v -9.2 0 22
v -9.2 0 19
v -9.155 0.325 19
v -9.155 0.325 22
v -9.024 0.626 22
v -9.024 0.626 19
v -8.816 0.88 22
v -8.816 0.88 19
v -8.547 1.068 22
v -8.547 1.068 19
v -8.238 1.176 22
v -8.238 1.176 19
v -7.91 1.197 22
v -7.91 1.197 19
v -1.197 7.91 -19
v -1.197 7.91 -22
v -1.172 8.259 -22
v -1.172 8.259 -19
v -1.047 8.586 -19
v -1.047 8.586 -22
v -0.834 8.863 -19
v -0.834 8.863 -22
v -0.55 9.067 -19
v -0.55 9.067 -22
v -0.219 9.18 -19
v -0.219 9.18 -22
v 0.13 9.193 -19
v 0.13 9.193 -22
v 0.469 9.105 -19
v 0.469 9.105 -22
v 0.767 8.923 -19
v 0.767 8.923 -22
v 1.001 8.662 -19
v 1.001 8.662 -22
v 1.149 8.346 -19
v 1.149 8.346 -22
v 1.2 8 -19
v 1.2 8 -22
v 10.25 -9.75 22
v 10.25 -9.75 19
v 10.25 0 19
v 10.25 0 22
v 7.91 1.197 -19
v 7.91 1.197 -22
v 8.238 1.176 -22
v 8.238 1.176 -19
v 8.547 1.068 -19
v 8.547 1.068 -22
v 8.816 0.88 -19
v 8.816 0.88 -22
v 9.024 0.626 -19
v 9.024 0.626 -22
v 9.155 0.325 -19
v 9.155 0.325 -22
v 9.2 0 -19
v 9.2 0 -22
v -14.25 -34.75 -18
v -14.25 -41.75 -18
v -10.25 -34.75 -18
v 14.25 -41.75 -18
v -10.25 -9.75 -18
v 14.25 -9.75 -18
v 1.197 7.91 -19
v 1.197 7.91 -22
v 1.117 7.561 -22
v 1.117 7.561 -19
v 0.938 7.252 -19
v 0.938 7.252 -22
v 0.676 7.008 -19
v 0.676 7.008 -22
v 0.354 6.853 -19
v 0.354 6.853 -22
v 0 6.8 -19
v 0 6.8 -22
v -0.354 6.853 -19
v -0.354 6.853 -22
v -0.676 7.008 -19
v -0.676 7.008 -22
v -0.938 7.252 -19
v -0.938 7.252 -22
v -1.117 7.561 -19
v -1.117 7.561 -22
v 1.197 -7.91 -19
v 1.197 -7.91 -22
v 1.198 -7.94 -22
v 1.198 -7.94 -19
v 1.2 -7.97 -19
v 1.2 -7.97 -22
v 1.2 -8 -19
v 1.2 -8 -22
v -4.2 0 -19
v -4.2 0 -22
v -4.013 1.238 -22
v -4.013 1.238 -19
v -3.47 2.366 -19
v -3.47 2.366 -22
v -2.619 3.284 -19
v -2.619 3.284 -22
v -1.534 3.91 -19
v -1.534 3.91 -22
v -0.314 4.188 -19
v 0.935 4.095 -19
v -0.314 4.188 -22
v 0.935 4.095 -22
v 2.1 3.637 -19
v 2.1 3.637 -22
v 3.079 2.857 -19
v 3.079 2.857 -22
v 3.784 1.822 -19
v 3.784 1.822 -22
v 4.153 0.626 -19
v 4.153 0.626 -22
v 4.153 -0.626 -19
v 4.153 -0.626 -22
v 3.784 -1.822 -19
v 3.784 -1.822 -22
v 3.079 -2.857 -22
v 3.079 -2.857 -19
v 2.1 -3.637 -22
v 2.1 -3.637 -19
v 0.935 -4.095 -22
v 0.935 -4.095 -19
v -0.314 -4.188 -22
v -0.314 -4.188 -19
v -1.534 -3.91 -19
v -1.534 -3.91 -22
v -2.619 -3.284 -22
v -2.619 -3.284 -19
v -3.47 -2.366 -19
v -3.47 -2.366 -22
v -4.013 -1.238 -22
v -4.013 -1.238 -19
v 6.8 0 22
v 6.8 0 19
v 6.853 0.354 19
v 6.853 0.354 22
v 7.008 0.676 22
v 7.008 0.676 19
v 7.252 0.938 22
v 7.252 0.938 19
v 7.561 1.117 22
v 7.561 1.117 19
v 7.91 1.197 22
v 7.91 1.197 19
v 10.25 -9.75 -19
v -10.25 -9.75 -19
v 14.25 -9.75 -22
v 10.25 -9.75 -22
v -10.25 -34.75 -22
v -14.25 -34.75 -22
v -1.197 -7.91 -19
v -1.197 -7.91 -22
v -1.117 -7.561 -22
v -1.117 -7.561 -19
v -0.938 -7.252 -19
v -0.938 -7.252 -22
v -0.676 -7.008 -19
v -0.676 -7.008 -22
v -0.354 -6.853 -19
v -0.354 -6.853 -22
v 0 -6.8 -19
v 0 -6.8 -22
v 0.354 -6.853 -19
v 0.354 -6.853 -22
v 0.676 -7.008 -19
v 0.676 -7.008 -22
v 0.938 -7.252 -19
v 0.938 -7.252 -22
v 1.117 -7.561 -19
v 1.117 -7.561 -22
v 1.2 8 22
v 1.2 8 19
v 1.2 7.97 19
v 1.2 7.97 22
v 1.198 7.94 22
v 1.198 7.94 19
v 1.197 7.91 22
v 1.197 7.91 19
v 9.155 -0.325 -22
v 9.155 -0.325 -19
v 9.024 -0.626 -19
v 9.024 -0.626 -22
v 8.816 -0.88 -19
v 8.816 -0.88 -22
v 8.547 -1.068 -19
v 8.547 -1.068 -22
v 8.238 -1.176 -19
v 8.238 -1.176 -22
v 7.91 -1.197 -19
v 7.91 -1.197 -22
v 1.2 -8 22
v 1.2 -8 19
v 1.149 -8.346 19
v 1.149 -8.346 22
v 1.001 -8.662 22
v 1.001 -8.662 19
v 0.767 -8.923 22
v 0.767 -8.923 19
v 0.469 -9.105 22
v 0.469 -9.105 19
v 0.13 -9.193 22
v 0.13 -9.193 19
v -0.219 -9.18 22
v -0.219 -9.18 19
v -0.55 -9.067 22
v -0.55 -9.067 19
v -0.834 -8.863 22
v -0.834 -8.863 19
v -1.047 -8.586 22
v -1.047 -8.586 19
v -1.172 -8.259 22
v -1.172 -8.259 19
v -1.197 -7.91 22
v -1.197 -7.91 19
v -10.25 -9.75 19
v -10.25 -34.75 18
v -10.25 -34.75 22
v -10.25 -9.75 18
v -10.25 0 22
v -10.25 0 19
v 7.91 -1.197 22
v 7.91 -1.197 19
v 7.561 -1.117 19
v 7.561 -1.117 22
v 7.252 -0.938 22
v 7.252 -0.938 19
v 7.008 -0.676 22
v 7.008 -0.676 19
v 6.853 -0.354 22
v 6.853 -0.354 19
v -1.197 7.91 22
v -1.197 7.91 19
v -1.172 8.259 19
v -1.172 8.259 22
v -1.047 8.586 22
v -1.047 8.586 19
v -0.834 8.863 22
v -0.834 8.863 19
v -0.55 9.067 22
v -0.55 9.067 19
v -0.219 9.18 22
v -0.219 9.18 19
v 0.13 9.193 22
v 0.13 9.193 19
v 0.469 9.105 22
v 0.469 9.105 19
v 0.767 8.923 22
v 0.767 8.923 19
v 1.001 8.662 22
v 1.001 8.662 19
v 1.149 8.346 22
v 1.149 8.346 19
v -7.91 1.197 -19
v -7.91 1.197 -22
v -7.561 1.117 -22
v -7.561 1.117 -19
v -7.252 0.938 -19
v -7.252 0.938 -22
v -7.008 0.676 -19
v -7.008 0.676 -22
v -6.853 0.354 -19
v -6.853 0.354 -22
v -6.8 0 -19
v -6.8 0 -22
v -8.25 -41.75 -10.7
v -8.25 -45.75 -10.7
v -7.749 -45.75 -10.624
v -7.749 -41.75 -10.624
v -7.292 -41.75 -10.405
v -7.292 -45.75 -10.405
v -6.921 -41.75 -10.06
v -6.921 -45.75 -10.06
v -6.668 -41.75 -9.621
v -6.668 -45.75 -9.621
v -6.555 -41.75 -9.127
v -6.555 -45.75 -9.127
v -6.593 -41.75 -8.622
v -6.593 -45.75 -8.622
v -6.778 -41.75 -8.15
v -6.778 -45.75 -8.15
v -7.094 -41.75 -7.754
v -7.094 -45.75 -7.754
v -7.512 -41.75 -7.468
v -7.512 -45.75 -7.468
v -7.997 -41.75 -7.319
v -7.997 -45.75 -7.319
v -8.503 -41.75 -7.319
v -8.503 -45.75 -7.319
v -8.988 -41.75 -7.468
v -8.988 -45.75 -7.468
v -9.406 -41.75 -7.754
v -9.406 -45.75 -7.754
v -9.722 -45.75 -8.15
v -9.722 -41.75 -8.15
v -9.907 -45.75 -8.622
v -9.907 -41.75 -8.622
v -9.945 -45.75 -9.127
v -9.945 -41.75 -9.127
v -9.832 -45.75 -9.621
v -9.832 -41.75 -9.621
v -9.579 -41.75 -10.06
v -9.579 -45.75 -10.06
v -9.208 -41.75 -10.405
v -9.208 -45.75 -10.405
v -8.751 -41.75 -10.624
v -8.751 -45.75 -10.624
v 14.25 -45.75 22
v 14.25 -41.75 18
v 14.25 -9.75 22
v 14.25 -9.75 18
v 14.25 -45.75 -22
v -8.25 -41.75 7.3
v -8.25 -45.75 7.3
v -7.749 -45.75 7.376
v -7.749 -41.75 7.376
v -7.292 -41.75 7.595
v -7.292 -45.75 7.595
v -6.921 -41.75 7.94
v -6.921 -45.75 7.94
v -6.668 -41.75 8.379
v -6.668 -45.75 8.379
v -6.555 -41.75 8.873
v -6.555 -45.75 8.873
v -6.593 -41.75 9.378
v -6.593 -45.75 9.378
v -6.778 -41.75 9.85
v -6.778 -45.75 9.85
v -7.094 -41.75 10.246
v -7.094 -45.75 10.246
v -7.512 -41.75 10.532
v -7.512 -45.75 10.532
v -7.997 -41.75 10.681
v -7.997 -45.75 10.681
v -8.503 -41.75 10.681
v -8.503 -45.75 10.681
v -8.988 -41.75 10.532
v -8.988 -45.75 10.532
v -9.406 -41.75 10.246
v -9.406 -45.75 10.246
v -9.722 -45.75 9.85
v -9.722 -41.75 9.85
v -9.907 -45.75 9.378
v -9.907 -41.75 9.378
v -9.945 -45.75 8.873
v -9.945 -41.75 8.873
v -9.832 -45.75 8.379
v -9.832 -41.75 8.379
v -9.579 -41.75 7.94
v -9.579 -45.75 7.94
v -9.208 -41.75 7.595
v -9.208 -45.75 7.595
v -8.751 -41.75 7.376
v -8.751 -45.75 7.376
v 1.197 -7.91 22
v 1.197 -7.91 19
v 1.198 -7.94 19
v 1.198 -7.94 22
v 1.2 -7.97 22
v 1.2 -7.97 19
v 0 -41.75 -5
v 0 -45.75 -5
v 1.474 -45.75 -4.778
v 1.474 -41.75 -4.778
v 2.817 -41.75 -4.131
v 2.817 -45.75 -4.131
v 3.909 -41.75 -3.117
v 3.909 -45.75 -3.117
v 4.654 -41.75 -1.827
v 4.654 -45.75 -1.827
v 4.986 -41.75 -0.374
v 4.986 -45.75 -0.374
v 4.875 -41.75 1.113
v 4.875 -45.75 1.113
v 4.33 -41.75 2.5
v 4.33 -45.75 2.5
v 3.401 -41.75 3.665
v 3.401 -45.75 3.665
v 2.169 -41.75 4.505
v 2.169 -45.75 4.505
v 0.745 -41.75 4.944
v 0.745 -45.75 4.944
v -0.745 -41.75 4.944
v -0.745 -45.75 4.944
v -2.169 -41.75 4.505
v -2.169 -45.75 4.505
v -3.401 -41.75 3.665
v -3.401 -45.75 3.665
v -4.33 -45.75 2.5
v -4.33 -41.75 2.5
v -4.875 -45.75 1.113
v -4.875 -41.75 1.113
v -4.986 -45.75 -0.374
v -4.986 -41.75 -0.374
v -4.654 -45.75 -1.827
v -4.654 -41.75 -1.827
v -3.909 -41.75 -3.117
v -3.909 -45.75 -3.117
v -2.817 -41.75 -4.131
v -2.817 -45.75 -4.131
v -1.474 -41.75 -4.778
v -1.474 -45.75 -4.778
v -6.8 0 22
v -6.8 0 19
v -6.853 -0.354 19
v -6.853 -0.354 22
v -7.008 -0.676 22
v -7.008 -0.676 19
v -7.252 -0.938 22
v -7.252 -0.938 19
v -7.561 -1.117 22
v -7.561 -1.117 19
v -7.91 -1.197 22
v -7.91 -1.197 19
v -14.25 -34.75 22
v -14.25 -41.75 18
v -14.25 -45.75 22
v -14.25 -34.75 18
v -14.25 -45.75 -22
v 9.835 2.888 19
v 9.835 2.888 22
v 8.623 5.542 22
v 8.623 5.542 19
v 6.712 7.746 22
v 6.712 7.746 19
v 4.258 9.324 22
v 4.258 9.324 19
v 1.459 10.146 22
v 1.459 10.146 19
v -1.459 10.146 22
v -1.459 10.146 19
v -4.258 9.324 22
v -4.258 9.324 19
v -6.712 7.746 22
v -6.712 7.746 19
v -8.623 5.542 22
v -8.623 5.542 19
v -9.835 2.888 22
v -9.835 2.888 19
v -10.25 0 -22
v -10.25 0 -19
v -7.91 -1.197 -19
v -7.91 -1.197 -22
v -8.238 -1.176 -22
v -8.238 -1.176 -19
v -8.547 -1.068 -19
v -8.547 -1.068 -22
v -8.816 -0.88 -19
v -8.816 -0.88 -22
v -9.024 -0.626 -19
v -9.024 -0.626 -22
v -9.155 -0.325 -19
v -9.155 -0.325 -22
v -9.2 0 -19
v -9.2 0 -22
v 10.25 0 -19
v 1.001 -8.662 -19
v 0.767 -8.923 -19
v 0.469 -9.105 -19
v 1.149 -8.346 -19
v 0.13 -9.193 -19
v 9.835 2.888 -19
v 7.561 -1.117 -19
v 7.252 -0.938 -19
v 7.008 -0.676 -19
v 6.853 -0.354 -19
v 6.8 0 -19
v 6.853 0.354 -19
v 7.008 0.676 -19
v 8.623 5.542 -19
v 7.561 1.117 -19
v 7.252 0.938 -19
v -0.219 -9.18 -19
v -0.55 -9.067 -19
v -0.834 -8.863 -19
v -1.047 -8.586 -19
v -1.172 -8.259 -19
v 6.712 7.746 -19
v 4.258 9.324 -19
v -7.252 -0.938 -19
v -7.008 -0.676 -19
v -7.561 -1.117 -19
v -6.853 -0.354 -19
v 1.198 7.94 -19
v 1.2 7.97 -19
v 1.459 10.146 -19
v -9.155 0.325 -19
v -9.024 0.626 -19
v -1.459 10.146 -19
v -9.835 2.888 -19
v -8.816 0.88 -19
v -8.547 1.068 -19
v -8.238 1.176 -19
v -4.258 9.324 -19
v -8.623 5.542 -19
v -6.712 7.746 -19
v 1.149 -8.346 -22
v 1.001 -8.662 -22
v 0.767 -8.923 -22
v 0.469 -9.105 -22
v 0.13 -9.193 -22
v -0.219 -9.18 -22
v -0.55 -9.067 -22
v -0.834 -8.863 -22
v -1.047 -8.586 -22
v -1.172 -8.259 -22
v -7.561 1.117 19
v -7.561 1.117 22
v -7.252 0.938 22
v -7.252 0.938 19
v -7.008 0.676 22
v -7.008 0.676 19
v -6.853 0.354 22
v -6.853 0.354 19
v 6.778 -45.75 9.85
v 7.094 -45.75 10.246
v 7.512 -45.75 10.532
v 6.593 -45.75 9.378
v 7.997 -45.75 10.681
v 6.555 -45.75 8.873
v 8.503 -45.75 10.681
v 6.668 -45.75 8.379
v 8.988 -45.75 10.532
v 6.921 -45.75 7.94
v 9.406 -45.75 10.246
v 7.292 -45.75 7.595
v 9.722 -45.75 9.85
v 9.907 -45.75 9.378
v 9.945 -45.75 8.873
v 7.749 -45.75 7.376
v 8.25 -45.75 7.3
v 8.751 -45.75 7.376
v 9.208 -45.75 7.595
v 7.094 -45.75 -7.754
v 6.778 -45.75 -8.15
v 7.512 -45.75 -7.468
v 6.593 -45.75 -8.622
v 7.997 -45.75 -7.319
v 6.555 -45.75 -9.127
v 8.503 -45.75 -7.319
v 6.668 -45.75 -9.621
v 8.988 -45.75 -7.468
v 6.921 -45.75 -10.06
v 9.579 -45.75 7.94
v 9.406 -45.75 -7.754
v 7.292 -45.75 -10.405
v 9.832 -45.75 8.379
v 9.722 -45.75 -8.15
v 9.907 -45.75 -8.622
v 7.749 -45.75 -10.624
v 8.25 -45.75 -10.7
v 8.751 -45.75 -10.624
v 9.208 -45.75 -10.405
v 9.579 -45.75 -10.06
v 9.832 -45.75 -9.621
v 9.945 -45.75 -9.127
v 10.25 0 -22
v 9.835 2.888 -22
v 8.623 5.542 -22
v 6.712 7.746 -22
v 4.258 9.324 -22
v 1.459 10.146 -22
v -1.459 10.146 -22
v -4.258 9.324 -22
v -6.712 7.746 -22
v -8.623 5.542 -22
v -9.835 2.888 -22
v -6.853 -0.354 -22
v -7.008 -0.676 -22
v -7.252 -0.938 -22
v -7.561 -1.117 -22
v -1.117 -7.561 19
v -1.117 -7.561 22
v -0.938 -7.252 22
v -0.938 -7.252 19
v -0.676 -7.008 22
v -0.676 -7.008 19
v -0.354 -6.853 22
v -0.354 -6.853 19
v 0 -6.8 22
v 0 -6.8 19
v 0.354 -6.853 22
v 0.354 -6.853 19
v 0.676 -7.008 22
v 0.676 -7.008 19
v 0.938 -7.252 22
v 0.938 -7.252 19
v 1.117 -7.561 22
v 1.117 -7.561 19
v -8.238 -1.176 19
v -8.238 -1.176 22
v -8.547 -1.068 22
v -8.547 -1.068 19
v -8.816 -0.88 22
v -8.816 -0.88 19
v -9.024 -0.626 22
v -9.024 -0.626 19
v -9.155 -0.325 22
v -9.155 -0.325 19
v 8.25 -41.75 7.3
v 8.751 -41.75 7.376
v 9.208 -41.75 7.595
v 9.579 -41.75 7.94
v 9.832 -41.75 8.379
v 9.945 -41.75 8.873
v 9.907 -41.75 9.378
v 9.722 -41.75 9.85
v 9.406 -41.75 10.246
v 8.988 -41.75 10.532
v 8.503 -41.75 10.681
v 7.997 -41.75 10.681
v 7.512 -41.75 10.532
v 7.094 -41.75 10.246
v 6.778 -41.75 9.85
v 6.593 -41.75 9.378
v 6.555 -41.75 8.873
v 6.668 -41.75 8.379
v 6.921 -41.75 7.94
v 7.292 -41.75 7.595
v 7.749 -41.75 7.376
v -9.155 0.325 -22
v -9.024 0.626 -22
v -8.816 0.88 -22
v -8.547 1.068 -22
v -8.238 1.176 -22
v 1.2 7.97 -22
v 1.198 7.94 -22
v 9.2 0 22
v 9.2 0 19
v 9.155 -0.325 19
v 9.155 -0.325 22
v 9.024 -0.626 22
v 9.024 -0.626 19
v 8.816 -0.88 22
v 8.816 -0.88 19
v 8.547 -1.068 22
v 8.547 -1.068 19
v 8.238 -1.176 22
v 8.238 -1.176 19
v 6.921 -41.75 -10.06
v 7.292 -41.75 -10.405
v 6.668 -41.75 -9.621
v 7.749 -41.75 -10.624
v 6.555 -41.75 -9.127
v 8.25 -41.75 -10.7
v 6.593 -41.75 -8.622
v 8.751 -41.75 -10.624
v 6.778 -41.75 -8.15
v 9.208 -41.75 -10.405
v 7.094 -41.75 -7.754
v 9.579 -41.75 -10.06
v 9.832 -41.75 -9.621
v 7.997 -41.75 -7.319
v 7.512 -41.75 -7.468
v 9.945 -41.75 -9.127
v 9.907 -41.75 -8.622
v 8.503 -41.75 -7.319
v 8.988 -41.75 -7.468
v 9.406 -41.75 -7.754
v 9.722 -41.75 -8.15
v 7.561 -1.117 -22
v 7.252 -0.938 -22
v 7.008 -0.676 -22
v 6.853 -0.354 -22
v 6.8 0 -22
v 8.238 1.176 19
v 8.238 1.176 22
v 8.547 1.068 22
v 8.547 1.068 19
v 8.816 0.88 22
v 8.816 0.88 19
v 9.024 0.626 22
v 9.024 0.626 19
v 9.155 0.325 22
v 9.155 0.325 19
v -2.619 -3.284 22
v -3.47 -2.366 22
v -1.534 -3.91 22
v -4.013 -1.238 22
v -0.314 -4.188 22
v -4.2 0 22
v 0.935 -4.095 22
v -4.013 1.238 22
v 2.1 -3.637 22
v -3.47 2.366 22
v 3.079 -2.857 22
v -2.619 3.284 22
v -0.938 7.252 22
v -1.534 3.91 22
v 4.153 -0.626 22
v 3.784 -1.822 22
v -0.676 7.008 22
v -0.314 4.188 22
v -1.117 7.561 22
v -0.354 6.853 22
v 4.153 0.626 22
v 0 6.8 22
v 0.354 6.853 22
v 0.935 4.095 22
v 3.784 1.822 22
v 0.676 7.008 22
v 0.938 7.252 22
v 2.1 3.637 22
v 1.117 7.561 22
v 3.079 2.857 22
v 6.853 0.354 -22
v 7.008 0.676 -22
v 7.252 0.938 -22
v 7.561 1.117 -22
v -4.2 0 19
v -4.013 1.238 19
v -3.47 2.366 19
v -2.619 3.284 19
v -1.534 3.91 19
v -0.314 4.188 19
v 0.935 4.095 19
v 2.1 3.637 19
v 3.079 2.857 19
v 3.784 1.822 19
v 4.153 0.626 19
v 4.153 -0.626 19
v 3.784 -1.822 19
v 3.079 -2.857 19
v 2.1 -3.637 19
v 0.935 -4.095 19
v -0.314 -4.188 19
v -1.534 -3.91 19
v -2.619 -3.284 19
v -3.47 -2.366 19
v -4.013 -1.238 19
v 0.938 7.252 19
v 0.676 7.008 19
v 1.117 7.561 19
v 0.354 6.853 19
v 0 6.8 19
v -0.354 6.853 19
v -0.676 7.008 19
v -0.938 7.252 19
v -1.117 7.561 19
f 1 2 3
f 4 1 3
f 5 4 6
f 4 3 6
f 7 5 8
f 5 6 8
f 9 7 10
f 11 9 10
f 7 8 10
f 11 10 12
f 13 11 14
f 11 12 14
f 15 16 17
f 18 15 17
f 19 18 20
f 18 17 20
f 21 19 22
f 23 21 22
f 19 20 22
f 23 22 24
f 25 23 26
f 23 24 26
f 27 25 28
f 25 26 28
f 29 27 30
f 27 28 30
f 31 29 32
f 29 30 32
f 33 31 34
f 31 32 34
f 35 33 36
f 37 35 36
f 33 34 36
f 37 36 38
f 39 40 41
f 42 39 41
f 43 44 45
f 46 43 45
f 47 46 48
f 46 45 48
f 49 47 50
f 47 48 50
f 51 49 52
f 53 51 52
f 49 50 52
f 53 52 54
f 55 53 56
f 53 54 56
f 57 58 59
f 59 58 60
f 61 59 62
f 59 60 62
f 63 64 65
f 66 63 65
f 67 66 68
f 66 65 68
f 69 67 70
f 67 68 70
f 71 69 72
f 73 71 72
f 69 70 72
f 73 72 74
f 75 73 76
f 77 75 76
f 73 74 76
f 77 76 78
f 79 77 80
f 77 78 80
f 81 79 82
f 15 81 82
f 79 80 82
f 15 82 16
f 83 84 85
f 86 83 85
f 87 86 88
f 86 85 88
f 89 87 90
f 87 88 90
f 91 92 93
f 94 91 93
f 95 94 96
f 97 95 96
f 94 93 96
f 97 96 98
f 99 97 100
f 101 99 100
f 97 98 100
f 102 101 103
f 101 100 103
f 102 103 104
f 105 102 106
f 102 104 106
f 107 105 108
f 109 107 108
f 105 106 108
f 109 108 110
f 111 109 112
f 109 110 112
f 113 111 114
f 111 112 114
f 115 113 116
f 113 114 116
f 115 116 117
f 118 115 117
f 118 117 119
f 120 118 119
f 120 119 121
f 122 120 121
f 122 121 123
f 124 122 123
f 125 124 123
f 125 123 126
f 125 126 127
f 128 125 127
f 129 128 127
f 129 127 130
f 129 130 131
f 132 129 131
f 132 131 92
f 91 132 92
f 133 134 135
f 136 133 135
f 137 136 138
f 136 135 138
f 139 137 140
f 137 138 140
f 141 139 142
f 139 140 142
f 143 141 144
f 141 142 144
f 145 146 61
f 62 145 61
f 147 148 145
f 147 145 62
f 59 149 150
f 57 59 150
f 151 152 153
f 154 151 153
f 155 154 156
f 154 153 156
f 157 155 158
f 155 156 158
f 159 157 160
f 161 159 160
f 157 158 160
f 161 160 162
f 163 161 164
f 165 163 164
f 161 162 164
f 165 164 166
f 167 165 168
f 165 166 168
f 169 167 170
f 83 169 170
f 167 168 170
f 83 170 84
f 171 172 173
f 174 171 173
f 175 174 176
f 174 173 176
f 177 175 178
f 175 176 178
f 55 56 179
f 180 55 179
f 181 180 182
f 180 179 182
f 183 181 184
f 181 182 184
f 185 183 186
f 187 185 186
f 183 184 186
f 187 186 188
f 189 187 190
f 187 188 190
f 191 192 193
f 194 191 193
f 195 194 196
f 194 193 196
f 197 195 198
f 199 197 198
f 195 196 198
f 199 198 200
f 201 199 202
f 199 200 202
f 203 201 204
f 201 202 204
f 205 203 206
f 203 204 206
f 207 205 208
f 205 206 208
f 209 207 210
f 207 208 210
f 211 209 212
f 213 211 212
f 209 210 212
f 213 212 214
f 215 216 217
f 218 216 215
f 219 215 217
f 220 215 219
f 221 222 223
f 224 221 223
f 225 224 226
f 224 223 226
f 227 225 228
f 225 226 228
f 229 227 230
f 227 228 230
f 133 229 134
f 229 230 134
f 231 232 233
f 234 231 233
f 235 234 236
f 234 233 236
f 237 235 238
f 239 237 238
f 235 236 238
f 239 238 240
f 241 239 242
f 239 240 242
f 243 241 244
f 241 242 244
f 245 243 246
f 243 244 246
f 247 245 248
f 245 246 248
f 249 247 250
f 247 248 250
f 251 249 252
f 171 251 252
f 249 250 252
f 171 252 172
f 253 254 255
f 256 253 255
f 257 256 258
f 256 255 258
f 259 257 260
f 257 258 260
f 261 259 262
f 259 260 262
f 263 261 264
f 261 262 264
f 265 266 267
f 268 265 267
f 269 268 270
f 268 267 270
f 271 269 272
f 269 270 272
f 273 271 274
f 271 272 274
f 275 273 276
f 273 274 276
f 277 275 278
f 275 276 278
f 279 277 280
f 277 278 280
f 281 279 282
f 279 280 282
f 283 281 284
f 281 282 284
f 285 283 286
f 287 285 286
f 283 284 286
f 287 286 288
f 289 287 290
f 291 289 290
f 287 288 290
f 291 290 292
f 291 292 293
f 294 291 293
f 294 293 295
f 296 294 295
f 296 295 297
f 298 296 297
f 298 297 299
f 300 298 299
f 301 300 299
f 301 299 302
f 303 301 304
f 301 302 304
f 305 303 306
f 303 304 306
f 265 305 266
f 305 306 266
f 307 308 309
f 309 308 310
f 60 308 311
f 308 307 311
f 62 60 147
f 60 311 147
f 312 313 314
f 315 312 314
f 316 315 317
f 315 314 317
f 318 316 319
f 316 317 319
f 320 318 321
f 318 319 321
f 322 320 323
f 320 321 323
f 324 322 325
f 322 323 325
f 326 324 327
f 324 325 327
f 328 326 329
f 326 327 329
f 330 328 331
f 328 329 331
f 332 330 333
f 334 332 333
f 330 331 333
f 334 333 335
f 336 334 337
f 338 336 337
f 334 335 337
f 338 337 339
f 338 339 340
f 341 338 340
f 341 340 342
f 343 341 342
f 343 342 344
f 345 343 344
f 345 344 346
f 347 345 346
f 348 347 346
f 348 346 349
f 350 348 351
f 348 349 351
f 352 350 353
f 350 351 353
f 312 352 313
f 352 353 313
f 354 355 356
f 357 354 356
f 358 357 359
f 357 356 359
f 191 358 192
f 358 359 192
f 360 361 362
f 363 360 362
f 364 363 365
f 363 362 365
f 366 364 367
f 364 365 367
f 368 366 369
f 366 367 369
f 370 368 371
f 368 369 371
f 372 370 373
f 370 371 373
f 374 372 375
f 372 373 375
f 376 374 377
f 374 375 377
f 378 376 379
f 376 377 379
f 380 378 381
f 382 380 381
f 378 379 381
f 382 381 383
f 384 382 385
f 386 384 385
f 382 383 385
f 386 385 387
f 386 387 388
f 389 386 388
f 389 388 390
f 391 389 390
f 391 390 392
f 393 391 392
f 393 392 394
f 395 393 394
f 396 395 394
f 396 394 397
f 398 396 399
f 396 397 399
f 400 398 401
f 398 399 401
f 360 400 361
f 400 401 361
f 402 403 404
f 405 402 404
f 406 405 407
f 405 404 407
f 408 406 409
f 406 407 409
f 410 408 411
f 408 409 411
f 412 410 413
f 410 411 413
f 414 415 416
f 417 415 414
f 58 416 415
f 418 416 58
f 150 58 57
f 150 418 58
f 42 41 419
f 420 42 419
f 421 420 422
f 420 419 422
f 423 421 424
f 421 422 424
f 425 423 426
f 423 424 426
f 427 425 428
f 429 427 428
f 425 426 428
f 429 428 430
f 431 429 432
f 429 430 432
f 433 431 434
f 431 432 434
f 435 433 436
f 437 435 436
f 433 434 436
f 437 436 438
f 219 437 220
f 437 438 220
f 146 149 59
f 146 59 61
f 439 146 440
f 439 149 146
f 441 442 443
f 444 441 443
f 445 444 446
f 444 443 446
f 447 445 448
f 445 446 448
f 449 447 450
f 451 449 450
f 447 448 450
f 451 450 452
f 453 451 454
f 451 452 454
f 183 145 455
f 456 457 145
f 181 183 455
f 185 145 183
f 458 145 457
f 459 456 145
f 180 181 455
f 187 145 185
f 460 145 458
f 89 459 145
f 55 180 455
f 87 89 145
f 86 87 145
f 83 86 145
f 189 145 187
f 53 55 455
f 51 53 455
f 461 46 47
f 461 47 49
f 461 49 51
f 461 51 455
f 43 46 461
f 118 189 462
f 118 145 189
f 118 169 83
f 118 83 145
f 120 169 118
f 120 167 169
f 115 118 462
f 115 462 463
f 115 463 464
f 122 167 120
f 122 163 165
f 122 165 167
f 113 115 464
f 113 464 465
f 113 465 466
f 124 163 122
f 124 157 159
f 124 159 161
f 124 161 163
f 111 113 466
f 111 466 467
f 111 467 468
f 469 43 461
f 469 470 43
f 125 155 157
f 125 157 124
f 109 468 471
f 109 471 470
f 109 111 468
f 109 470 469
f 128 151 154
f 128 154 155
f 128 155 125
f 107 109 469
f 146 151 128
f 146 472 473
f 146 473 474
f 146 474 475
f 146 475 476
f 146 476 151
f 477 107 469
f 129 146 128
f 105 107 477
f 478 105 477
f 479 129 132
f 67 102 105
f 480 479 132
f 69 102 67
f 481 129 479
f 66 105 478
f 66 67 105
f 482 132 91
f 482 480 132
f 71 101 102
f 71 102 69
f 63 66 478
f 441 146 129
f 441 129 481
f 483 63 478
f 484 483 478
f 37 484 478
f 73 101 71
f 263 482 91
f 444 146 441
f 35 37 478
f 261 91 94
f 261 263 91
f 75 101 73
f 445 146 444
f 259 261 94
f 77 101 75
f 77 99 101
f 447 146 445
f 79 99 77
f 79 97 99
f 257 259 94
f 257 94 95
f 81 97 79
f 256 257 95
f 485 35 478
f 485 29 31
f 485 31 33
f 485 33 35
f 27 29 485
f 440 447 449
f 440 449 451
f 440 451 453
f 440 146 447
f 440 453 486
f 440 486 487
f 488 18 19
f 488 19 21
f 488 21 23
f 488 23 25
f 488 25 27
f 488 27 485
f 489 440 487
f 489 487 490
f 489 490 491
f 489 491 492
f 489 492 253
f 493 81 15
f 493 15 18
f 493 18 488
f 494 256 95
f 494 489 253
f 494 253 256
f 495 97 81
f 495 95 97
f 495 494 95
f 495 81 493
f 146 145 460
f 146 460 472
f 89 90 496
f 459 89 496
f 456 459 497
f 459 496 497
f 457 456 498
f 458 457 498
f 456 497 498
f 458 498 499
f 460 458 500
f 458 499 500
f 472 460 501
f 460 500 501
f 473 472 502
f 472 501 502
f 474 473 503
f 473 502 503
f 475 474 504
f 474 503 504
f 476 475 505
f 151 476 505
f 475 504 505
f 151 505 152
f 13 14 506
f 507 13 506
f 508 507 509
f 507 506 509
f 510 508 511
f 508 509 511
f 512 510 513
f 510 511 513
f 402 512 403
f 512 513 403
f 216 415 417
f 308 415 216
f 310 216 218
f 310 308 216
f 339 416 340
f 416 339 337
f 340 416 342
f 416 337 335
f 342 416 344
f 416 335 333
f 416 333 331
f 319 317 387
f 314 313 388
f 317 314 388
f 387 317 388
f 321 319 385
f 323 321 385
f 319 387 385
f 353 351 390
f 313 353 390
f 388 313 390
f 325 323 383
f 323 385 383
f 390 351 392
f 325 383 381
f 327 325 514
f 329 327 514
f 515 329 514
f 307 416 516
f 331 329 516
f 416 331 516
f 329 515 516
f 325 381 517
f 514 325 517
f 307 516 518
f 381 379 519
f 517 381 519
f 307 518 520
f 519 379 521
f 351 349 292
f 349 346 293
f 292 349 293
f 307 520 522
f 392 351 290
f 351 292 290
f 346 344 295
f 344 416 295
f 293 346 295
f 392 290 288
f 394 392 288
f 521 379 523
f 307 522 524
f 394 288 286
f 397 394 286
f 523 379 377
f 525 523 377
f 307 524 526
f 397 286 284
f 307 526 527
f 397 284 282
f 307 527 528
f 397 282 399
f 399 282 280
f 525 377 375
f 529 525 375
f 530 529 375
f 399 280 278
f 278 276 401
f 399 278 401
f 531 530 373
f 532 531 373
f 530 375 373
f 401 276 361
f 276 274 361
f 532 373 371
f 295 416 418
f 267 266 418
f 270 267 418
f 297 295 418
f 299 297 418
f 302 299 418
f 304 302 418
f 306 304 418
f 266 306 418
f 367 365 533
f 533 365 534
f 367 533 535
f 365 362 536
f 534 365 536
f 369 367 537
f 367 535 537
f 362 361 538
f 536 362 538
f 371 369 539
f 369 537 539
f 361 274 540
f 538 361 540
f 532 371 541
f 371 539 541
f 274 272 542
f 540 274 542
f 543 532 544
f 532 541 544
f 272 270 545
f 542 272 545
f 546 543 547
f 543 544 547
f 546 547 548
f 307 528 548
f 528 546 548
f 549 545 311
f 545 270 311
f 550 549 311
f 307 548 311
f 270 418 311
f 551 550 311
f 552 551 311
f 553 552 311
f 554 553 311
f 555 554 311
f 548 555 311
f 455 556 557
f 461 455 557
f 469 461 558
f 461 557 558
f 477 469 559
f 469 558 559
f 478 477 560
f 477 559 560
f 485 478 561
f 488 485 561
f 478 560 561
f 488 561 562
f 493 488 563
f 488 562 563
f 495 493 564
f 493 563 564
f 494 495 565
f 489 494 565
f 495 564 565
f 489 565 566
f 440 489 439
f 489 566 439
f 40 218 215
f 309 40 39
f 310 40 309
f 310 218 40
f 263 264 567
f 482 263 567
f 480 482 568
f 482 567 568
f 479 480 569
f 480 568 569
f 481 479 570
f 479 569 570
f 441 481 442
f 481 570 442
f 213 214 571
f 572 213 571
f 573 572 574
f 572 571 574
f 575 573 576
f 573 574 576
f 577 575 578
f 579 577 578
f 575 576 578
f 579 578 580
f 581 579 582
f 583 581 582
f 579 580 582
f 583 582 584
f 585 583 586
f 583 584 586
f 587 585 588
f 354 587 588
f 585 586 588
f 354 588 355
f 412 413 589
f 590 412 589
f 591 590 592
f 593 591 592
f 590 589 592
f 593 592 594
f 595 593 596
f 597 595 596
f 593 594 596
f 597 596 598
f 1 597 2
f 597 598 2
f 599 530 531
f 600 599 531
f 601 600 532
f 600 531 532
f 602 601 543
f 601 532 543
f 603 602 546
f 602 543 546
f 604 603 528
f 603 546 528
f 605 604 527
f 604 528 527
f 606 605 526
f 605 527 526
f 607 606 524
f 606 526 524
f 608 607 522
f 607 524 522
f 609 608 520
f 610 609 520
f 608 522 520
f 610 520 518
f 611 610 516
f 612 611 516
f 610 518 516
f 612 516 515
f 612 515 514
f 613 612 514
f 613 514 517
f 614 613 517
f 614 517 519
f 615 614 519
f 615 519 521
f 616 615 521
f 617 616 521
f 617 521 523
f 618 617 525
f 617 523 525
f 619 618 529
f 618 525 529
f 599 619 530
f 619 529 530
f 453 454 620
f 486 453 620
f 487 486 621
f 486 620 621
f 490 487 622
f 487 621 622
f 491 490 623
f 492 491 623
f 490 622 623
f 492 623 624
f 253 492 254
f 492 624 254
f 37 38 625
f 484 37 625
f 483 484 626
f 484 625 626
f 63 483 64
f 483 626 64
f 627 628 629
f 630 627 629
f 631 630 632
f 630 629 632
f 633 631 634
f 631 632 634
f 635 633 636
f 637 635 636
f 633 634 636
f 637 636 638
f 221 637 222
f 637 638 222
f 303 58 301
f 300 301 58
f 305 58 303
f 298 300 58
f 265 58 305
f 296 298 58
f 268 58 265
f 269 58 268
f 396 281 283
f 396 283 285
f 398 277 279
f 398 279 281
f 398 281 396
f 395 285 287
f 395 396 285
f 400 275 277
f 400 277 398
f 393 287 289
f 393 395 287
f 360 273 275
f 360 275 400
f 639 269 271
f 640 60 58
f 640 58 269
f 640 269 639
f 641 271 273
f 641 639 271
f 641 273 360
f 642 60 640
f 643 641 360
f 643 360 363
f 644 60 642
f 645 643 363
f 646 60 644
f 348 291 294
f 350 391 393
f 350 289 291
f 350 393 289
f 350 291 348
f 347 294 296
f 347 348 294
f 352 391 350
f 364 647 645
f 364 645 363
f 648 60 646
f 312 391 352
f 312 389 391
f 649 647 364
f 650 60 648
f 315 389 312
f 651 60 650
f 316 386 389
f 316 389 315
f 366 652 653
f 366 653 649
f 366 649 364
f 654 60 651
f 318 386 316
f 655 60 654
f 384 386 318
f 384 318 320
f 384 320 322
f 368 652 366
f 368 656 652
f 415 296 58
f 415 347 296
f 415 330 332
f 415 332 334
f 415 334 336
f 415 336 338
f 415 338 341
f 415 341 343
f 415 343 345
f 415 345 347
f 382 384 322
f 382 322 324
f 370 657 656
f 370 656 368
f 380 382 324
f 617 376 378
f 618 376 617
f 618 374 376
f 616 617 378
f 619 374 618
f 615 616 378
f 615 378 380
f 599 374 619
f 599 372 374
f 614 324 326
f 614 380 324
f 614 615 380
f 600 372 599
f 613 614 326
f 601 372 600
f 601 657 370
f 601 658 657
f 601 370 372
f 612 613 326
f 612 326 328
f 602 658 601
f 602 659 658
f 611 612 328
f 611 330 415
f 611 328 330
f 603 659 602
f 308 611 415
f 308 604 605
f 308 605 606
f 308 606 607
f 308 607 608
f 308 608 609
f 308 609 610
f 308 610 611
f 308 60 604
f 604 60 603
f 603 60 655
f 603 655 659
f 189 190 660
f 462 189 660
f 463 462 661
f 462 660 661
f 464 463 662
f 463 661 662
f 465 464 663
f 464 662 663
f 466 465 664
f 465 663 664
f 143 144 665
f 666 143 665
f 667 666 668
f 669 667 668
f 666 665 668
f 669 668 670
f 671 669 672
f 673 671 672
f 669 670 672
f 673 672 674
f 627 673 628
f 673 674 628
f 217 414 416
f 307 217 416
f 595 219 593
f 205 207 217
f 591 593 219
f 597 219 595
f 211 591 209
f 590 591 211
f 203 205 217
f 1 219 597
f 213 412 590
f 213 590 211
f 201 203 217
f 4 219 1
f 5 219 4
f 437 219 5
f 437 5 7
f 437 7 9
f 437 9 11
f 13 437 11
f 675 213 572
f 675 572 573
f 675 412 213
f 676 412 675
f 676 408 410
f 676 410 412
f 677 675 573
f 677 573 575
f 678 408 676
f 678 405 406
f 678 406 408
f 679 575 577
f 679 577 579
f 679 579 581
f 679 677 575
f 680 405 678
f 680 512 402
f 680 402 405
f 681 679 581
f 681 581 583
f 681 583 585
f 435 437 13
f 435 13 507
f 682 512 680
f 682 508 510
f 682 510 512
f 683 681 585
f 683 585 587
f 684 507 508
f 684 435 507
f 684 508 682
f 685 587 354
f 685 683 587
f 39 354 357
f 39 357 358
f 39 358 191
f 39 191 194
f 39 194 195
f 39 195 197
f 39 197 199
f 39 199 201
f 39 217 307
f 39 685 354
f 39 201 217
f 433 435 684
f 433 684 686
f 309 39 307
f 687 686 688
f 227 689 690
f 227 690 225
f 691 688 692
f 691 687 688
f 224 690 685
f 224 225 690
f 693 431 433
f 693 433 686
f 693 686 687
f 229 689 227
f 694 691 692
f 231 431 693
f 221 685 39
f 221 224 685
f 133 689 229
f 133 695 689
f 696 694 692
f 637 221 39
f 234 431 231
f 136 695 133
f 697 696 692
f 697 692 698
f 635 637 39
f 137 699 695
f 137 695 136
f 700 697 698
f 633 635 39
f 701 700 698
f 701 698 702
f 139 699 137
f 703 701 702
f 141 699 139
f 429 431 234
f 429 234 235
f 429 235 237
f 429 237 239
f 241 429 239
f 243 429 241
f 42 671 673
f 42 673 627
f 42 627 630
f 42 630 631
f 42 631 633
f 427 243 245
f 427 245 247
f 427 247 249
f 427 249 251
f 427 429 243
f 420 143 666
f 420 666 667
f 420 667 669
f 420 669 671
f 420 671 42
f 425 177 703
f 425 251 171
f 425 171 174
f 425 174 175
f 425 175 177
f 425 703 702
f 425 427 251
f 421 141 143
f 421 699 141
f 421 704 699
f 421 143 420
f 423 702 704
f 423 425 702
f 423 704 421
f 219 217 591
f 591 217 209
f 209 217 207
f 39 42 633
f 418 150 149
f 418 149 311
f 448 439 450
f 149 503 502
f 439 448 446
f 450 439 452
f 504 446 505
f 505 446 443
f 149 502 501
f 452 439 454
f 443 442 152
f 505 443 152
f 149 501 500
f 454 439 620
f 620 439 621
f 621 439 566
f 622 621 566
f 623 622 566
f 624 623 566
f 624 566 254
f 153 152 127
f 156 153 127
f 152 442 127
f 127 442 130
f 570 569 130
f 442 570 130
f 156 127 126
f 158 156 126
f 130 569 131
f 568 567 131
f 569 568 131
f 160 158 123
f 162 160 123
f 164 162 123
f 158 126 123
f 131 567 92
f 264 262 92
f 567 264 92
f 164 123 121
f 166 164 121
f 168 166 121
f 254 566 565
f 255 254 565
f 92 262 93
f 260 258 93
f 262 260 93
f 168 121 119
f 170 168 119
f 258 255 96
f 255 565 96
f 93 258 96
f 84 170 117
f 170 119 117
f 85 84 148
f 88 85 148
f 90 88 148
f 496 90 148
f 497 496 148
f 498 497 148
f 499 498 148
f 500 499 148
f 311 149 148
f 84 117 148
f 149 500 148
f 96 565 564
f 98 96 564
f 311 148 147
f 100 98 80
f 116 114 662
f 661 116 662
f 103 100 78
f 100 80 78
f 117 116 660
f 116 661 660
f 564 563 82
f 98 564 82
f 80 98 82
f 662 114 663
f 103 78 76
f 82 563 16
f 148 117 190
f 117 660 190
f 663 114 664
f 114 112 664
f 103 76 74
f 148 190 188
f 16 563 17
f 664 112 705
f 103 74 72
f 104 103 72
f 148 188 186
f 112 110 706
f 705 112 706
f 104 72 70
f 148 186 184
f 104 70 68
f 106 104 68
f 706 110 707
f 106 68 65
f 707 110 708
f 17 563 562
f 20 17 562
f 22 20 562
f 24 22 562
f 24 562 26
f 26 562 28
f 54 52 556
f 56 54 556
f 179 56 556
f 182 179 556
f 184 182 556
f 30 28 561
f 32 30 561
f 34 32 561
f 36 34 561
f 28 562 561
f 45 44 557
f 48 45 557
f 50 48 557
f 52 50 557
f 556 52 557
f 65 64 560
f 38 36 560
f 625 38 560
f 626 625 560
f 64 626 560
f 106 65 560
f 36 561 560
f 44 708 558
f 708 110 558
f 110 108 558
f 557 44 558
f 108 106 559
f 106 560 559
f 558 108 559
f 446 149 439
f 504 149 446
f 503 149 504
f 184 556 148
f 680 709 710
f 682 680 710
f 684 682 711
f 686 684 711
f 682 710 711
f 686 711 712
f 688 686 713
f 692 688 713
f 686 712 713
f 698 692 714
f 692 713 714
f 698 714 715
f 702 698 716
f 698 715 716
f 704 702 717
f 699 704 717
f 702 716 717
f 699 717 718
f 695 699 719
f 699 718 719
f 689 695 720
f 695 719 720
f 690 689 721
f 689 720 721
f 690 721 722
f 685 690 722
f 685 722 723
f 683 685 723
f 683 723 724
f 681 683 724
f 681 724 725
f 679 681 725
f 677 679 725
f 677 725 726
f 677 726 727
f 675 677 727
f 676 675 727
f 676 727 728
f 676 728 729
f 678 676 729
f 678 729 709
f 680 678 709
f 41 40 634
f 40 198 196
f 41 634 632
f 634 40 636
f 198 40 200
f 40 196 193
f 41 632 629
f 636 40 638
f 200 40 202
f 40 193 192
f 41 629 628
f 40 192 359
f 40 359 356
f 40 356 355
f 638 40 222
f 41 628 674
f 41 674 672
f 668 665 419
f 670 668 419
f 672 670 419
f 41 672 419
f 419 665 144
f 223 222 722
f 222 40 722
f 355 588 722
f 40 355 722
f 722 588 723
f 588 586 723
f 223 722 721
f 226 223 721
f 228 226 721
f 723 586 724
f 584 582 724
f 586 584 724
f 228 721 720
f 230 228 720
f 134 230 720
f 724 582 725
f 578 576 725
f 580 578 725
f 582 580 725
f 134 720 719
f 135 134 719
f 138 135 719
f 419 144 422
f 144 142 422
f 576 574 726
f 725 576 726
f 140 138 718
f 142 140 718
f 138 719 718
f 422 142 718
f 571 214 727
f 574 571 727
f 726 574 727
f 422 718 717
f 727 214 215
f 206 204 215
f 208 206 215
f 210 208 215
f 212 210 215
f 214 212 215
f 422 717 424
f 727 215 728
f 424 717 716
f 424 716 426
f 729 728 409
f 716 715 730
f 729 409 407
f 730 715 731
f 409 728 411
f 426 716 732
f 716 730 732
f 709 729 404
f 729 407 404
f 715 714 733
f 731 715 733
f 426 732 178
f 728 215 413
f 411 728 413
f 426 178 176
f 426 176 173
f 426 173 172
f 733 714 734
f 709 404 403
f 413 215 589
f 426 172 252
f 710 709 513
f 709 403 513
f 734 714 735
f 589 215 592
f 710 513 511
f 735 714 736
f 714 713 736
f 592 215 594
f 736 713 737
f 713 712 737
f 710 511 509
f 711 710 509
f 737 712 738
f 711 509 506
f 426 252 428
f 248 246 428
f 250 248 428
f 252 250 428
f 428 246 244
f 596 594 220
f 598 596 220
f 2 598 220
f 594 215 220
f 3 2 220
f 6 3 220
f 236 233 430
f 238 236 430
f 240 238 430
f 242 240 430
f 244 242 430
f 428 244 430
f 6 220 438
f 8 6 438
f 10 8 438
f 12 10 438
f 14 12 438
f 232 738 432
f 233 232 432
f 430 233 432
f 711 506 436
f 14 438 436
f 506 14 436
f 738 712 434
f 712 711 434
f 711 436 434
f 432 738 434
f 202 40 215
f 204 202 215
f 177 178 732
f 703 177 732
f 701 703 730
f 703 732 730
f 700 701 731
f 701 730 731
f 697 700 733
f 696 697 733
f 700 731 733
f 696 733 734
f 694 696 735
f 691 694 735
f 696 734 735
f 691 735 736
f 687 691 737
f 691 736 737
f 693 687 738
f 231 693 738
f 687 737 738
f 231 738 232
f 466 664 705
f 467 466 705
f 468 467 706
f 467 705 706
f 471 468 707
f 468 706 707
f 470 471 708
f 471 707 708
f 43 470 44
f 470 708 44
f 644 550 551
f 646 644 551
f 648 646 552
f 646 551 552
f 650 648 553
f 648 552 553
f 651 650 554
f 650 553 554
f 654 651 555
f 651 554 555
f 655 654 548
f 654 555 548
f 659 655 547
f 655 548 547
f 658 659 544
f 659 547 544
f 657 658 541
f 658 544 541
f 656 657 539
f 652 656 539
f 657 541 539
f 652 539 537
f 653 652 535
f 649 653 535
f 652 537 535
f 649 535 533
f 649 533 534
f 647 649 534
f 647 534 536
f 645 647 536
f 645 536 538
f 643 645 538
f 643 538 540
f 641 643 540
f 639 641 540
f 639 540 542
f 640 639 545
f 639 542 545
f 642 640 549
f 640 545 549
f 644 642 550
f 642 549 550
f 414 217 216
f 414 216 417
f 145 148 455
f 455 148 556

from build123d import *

# Parameters (mm, degrees)
BOSS_EXTRUDE1_DEPTH      = 22
BOSS_EXTRUDE1_DEPTH_BACK = 22
SKETCH1_R                = 1.2
SKETCH1_R_2              = 4.2
SKETCH2_W                = 38
SKETCH2_H                = 20
CUT_EXTRUDE1_DEPTH       = 105.423416914
SKETCH3_W                = 7
SKETCH3_H                = 44
BOSS_EXTRUDE2_DEPTH      = 36
SKETCH5_W                = 34
SKETCH5_H                = 50
CUT_EXTRUDE3_DEPTH       = 109.047443283
SKETCH6_W                = 20.5
SKETCH6_H                = 54.25
CUT_EXTRUDE4_DEPTH       = 111.605436123
SKETCH20_W               = 28.5
SKETCH20_H               = 34
SKETCH20_R               = 1.7
SKETCH20_R_2             = 5
BOSS_EXTRUDE5_DEPTH      = 4
SKETCH21_W               = 3
SKETCH21_H               = 36
CUT_EXTRUDE12_DEPTH      = 66.777085676
SKETCH22_W               = 4
SKETCH22_H               = 25
CUT_EXTRUDE14_DEPTH      = 66.054784605
CUT_EXTRUDE15_DEPTH      = 57.367654732
CUT_EXTRUDE15_DEPTH_BACK = 57.367654732
SKETCH23_W               = 36
SKETCH23_H               = 32


with BuildPart() as part:
    # Sketch1 → Boss-Extrude1 (new, two sides: drawn at the far end of the back side and taken through both)
    with BuildSketch(Plane.XY.offset(-BOSS_EXTRUDE1_DEPTH_BACK)):
        with BuildLine():
            ThreePointArc((10.25, 0), (0, 10.25), (-10.25, 0))
            Line((-10.25, 0), (-10.25, -100))
            Line((-10.25, -100), (10.25, -100))
            Line((10.25, -100), (10.25, 0))
        make_face()
        with Locations((8, 0)):
            Circle(SKETCH1_R, mode=Mode.SUBTRACT)
        with Locations((0, 8)):
            Circle(SKETCH1_R, mode=Mode.SUBTRACT)
        with Locations((-8, 0)):
            Circle(SKETCH1_R, mode=Mode.SUBTRACT)
        Circle(SKETCH1_R_2, mode=Mode.SUBTRACT)
        with Locations((0, -8)):
            Circle(SKETCH1_R, mode=Mode.SUBTRACT)
    extrude(amount=BOSS_EXTRUDE1_DEPTH + BOSS_EXTRUDE1_DEPTH_BACK)

    # Sketch2 → Cut-Extrude1 (cut, through all)
    with BuildSketch(Plane.ZY.offset(10.25)):
        with Locations((0, 0.25)):
            Rectangle(SKETCH2_W, SKETCH2_H)
    extrude(amount=-CUT_EXTRUDE1_DEPTH, mode=Mode.SUBTRACT)

    # Sketch3 → Boss-Extrude2 (add)
    with BuildSketch(Plane(origin=(0, -9.75, 0), x_dir=(1, 0, 0), z_dir=(0, 1, 0))):
        with Locations((-13.75, 0)):
            Rectangle(SKETCH3_W, SKETCH3_H)
        with Locations((13.75, 0)):
            Rectangle(SKETCH3_W, SKETCH3_H)
    extrude(amount=-BOSS_EXTRUDE2_DEPTH)

    # Sketch5 → Cut-Extrude3 (cut, through all)
    with BuildSketch(Plane.ZY.offset(17.25)):
        with Locations((0, -34.75)):
            Rectangle(SKETCH5_W, SKETCH5_H)
    extrude(amount=-CUT_EXTRUDE3_DEPTH, mode=Mode.SUBTRACT)

    # Sketch6 → Cut-Extrude4 (cut, through all)
    with BuildSketch(Plane.XY.offset(22)):
        with Locations((0, -72.875)):
            Rectangle(SKETCH6_W, SKETCH6_H)
    extrude(amount=-CUT_EXTRUDE4_DEPTH, mode=Mode.SUBTRACT)


with BuildPart() as cut_extrude4_piece_1:
    # of the separate pieces the step leaves, piece 1, a body of its own (cut_extrude4_pieces)
    add(part.part.solids().sort_by_distance((17.25, -45.75, -17))[0])



with BuildPart() as cut_extrude4_piece_2:
    # of the separate pieces the step leaves, piece 2, a body of its own (cut_extrude4_pieces)
    add(part.part.solids().sort_by_distance((-10.25, 0, 22))[0])


with BuildPart() as cut_extrude4_piece_1_1:
    add(cut_extrude4_piece_1.part)

    add(cut_extrude4_piece_2.part)  # Boss-Extrude5 merges Cut-Extrude4 piece 2
    # Sketch20 → Boss-Extrude5 (add)
    with BuildSketch(Plane.XZ.offset(45.75)):
        Rectangle(SKETCH20_W, SKETCH20_H)
        with Locations((-8.25, -9)):
            Circle(SKETCH20_R, mode=Mode.SUBTRACT)
        with Locations((8.25, -9)):
            Circle(SKETCH20_R, mode=Mode.SUBTRACT)
        with Locations((-8.25, 9)):
            Circle(SKETCH20_R, mode=Mode.SUBTRACT)
        Circle(SKETCH20_R_2, mode=Mode.SUBTRACT)
        with Locations((8.25, 9)):
            Circle(SKETCH20_R, mode=Mode.SUBTRACT)
    extrude(amount=-BOSS_EXTRUDE5_DEPTH)

    # Sketch21 → Cut-Extrude12 (cut, through all)
    with BuildSketch(Plane(origin=(0, 0, -22), x_dir=(-1, 0, 0), z_dir=(0, 0, -1))):
        with Locations((-15.75, -27.75)):
            Rectangle(SKETCH21_W, SKETCH21_H)
        with Locations((15.75, -27.75)):
            Rectangle(SKETCH21_W, SKETCH21_H)
    extrude(amount=-CUT_EXTRUDE12_DEPTH, mode=Mode.SUBTRACT)

    # Sketch22 → Cut-Extrude14 (cut, through all)
    with BuildSketch(Plane(origin=(0, 0, -22), x_dir=(-1, 0, 0), z_dir=(0, 0, -1))):
        with Locations((12.25, -22.25)):
            Rectangle(SKETCH22_W, SKETCH22_H)
    extrude(amount=-CUT_EXTRUDE14_DEPTH, mode=Mode.SUBTRACT)

    # Sketch23 → Cut-Extrude15 (cut, two sides: drawn at the far end of the back side and taken through both)
    with BuildSketch(Plane.ZY.offset(10.25).offset(-CUT_EXTRUDE15_DEPTH_BACK)):
        with Locations((0, -25.75)):
            Rectangle(SKETCH23_W, SKETCH23_H)
    extrude(amount=CUT_EXTRUDE15_DEPTH + CUT_EXTRUDE15_DEPTH_BACK, mode=Mode.SUBTRACT)


solid = cut_extrude4_piece_1_1.part
